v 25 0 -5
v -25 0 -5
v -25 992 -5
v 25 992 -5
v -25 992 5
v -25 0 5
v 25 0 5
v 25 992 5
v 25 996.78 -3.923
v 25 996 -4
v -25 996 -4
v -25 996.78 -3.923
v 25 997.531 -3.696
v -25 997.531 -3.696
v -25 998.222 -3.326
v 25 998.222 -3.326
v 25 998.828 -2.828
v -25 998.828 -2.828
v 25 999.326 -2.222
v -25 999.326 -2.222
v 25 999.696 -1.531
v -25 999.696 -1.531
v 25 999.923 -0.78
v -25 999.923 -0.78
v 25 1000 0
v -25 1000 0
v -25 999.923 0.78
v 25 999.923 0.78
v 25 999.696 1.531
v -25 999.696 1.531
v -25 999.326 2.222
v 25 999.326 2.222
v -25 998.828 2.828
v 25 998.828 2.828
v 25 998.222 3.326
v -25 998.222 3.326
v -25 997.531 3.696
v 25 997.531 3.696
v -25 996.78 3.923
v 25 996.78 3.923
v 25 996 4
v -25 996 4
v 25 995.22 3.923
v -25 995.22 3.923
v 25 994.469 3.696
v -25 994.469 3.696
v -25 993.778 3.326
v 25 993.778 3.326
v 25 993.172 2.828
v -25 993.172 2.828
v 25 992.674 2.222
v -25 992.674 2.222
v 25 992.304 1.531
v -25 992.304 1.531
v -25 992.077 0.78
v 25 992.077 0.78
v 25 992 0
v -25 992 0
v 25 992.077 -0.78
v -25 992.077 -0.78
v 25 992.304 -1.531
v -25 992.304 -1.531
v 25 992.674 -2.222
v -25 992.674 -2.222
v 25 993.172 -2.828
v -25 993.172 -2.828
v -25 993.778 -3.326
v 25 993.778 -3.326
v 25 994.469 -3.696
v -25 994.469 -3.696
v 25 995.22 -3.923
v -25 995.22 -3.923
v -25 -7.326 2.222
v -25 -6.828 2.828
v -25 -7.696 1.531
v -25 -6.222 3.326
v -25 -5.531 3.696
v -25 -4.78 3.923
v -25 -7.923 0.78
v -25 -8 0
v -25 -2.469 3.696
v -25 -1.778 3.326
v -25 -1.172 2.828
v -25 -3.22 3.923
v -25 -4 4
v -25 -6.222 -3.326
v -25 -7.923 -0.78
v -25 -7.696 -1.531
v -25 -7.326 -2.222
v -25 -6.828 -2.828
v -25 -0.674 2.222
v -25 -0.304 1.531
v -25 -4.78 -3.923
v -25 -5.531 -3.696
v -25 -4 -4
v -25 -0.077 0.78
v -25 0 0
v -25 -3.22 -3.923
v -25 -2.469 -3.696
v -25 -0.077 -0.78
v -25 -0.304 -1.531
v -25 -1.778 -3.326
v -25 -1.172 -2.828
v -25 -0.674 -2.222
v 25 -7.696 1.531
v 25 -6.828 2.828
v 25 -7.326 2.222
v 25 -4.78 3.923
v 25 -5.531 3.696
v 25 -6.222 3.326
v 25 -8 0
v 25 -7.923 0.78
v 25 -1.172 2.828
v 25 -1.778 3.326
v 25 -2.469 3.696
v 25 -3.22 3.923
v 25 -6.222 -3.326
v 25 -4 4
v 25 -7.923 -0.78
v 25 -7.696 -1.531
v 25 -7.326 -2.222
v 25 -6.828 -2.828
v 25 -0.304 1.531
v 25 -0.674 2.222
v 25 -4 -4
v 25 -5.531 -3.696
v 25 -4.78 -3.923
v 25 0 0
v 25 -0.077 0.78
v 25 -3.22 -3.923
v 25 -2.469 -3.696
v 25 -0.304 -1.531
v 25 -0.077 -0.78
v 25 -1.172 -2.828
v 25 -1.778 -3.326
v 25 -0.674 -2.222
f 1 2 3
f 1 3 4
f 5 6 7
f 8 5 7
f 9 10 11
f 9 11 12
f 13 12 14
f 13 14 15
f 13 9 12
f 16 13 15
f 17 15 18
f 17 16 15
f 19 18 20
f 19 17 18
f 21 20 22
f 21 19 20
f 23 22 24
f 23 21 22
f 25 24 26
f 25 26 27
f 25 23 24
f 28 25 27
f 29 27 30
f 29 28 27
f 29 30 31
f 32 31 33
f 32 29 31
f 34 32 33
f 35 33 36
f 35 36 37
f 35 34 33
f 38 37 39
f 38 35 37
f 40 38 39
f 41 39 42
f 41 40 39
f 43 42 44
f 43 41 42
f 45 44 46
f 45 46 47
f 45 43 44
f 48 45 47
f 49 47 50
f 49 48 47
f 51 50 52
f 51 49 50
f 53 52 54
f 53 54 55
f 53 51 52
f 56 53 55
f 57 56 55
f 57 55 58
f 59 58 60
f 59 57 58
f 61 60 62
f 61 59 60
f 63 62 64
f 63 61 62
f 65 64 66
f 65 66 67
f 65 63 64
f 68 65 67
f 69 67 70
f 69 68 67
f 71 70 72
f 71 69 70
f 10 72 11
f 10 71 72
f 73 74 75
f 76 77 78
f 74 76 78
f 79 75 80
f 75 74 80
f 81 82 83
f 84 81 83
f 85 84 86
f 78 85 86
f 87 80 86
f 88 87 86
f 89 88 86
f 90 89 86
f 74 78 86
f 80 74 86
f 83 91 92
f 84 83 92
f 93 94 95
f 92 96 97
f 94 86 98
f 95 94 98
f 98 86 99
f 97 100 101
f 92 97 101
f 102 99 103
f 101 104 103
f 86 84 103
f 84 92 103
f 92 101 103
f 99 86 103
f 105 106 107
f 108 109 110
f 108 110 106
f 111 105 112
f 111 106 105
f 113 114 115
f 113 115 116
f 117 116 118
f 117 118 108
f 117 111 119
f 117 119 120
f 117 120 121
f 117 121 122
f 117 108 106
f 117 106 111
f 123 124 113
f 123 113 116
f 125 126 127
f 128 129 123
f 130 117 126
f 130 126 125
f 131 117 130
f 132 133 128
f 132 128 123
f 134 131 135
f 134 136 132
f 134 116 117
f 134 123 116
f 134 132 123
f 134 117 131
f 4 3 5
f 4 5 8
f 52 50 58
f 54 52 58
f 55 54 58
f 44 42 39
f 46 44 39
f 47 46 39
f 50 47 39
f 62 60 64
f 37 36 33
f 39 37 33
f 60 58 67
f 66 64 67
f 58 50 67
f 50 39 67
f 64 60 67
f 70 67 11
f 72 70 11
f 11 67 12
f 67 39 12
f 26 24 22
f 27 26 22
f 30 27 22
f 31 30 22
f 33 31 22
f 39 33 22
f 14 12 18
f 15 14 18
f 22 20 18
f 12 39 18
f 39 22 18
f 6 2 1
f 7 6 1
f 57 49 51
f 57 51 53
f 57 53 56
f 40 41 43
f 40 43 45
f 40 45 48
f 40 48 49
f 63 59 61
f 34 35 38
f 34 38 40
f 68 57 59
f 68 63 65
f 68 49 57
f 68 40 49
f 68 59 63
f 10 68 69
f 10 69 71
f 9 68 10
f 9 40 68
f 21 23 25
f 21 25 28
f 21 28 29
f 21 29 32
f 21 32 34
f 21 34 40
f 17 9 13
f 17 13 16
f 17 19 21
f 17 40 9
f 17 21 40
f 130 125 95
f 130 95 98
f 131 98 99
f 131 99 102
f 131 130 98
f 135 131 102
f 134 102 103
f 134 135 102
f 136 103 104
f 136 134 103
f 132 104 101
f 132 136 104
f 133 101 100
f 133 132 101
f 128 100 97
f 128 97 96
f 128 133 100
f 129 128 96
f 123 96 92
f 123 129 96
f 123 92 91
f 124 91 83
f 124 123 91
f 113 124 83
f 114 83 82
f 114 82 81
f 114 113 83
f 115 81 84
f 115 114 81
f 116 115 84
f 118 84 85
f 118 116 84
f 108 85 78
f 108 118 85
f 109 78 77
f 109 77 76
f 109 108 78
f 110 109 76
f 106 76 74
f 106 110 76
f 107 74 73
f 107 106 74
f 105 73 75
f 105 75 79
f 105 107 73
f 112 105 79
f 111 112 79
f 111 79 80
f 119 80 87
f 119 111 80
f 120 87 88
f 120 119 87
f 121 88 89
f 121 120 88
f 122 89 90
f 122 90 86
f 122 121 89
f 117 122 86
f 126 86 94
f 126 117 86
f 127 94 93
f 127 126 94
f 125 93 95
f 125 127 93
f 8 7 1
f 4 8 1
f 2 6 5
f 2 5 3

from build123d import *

# Parameters (mm, degrees)
SKETCH1_W             = 50
SKETCH1_H             = 10
BOSS_EXTRUDE1_DEPTH   = 992
SKETCH2_R             = 4
BOSS_EXTRUDE2_DEPTH   = 50
BOSS_EXTRUDE2_2_DEPTH = 50


with BuildPart() as part:
    # Sketch1 → Boss-Extrude1 (new body)
    with BuildSketch(Plane(origin=(0, 0, 0), x_dir=(1, 0, 0), z_dir=(0, 1, 0))):
        Rectangle(SKETCH1_W, SKETCH1_H)
    extrude(amount=BOSS_EXTRUDE1_DEPTH)


with BuildPart() as body_2:
    # Sketch2 → Boss-Extrude2 (new body)
    with BuildSketch(Plane(origin=(25, 0, 0), x_dir=(0, 0, -1), z_dir=(1, 0, 0))):
        with Locations((0, 996)):
            Circle(SKETCH2_R)
    extrude(amount=-BOSS_EXTRUDE2_DEPTH)


with BuildPart() as body_3:
    # Sketch2 → Boss-Extrude2 2 (new body)
    with BuildSketch(Plane(origin=(25, 0, 0), x_dir=(0, 0, -1), z_dir=(1, 0, 0))):
        with Locations((0, -4)):
            Circle(SKETCH2_R)
    extrude(amount=-BOSS_EXTRUDE2_2_DEPTH)


solid = Compound([part.part, body_2.part, body_3.part])
